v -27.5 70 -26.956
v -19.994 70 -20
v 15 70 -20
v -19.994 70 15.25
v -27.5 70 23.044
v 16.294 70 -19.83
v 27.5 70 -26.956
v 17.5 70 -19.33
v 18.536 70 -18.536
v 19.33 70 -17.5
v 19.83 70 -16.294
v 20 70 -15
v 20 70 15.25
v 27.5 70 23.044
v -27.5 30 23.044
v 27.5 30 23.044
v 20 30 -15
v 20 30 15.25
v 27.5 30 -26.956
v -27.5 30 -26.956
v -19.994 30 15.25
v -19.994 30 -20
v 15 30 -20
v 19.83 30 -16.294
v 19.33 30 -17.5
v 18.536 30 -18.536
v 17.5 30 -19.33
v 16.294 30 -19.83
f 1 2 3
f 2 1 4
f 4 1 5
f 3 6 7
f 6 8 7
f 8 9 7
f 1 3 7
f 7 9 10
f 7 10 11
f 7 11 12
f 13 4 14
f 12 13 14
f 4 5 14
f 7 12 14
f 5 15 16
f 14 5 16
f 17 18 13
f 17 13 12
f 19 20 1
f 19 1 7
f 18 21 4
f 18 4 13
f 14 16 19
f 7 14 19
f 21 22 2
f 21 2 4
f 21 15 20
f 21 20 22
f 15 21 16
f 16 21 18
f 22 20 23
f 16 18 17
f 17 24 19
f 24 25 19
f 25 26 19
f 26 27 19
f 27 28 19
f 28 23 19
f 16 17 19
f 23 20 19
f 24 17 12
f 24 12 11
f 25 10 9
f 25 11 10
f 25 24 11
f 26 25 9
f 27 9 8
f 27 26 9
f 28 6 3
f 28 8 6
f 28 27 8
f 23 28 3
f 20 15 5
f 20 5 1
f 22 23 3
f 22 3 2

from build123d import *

# Parameters (mm, degrees)
CROQUIS1_R                              = 15.25
CROQUIS1_R_2                            = 2.125
SOPORTE_CAJA_REDUCTORA_DEPTH            = 20
CROQUIS3_R                              = 2.125
CORTAR_EXTRUIR1_DEPTH                   = 51.423828692
REDONDEO1_R                             = 5
BOSS_EXTRUDE1_DEPTH                     = 20
CUT_EXTRUDE1_REACH                      = 55.852
SKETCH2_R                               = 1.625
CUT_EXTRUDE2_DEPTH                      = 2
SKETCH4_R                               = 1.625
CUT_EXTRUDE3_DEPTH                      = 63.291652731
CUT_EXTRUDE4_START                      = -4.5
CUT_EXTRUDE4_DEPTH                      = 2
CROQUIS6_W                              = 4.75
CROQUIS6_H                              = 4.75
CORTAR_EXTRUIR17_DEPTH                  = 42.231056256
CROQUIS7_W                              = 60
CROQUIS7_H                              = 20
CORTAR_EXTRUIR18_DEPTH                  = 51.423828692
SALIENTE_EXTRUIR2_DEPTH                 = 49
SOPORTE_START                           = -15
SOPORTE_MOTOR_DEPTH                     = 15
CROQUIS12_R                             = 2.125
AGUJEROS_DE_SUJECION_A_BASE_DEPTH       = 84.087679592
TUERCA_START                            = -4
TUERCA_AGUJERO_DE_SUJECION_A_BASE_DEPTH = 10
SALIENTE_EXTRUIR4_DEPTH                 = 15
CORTAR_EXTRUIR19_DEPTH                  = 25
CROQUIS14_W                             = 50
CROQUIS14_H                             = 118
CORTAR_EXTRUIR22_DEPTH                  = 146.556045907
CROQUIS15_W                             = 10
CROQUIS15_H                             = 7
CORTAR_EXTRUIR23_DEPTH                  = 42.231056256
CORTAR_EXTRUIR24_DEPTH                  = 42.231056256
CROQUIS18_W                             = 40
CROQUIS18_H                             = 10
CORTAR_EXTRUIR25_DEPTH                  = 44.27311521
SALIENTE_EXTRUIR5_DEPTH                 = 10
CROQUIS20_R                             = 1
CORTAR_EXTRUIR26_DEPTH                  = 49.229270158
CORTAR_EXTRUIR27_REACH                  = 62.959
CORTAR_EXTRUIR27_END_RADIUS             = 15.25
CROQUIS21_R                             = 1.625
CROQUIS22_R                             = 2.125
CROQUIS22_R_2                           = 1
SALIENTE_EXTRUIR6_DEPTH                 = 10
CROQUIS23_R                             = 1.625
CORTAR_EXTRUIR28_DEPTH                  = 52.269508521
CORTAR_EXTRUIR29_START                  = -3
CORTAR_EXTRUIR29_DEPTH                  = 10
SALIENTE_EXTRUIR7_DEPTH                 = 10
CORTAR_EXTRUIR30_REACH                  = 72.235
CROQUIS27_R                             = 1.625
CORTAR_EXTRUIR31_REACH                  = 75.235
CORTAR_EXTRUIR31_START                  = -3
CORTAR_EXTRUIR32_REACH                  = 58.612
CROQUIS29_R                             = 1.625
CORTAR_EXTRUIR33_REACH                  = 61.112
CORTAR_EXTRUIR33_START                  = -2.5
CROQUIS35_W                             = 13.305418987
CROQUIS35_H                             = 6.826864192
CORTAR_EXTRUIR34_DEPTH                  = 63.931555098
CORTAR_EXTRUIR34_DEPTH_BACK             = 63.931555098
CORTAR_EXTRUIR35_START                  = -3
CORTAR_EXTRUIR35_DEPTH                  = 10
SALIENTE_EXTRUIR8_DEPTH                 = 10
SALIENTE_EXTRUIR9_DEPTH                 = 13
SALIENTE_EXTRUIR10_DEPTH                = 3
CROQUIS40_W                             = 106.583537839
CROQUIS40_H                             = 47.391515964
CORTAR_EXTRUIR36_DEPTH                  = 80.887064817
CORTAR_EXTRUIR36_DEPTH_BACK             = 80.887064817
CORTAR_EXTRUIR37_DEPTH                  = 67.2524009
CORTAR_EXTRUIR37_DEPTH_BACK             = 67.2524009
CORTAR_EXTRUIR38_DEPTH                  = 79.704784639
CORTAR_EXTRUIR38_DEPTH_BACK             = 79.704784639
SALIENTE_EXTRUIR11_DEPTH                = 10
CORTAR_EXTRUIR39_DEPTH                  = 63.9908649
CROQUIS45_W                             = 31.470301378
CROQUIS45_H                             = 10
CROQUIS45_R                             = 1.625
SALIENTE_EXTRUIR12_DEPTH                = 2.5
SALIENTE_EXTRUIR13_DEPTH                = 10
CORTAR_EXTRUIR40_START                  = -2
CROQUIS47_R                             = 1.625
CORTAR_EXTRUIR40_DEPTH                  = 10
CORTAR_EXTRUIR41_START                  = -12
CROQUIS48_R                             = 1.625
CORTAR_EXTRUIR41_DEPTH                  = 12
CROQUIS49_W                             = 34.796066513
CROQUIS49_H                             = 42.211026982
CORTAR_EXTRUIR42_DEPTH                  = 52.795622989
CORTAR_EXTRUIR42_DEPTH_BACK             = 52.795622989
CROQUIS51_R                             = 15.25
CROQUIS51_R_2                           = 14.25
SALIENTE_EXTRUIR14_DEPTH                = 10
CORTAR_EXTRUIR43_DEPTH                  = 10
CORTAR_EXTRUIR44_DEPTH                  = 10
CORTAR_EXTRUIR45_DEPTH                  = 10
SALIENTE_EXTRUIR15_DEPTH                = 10
CROQUIS56_W                             = 55
CROQUIS56_H                             = 50
SALIENTE_EXTRUIR16_DEPTH                = 5
CROQUIS57_W                             = 42.651963039
CROQUIS57_H                             = 12.802181648
CORTAR_EXTRUIR46_DEPTH                  = 71.545387859
CORTAR_EXTRUIR46_DEPTH_BACK             = 71.545387859
CROQUIS58_R                             = 2.125
CORTAR_EXTRUIR47_DEPTH                  = 5
CROQUIS59_W                             = 55
CROQUIS59_H                             = 50
SALIENTE_EXTRUIR17_DEPTH                = 40


with BuildPart() as part:
    # Croquis1 → Soporte caja reductora (new body)
    with BuildSketch(Plane(origin=(0, 0, 0), x_dir=(1, 0, 0), z_dir=(0, 1, 0))):
        Polygon((-30, -15.25), (-20, -15.25), (-20, -20), (20, -20), (20, -15.25), (30, -15.25), (30, -7.25), (20, -4.25), (20, 20), (-20, 20), (-20, -4.25), (-30, -7.25), align=None)
        with Locations(Location((0, 0, 0), (0, 0, 270))):
            Circle(CROQUIS1_R, mode=Mode.SUBTRACT)
        with Locations(Location((-15, 15, 0), (0, 0, 270))):
            Circle(CROQUIS1_R_2, mode=Mode.SUBTRACT)
        with Locations(Location((15, 15, 0), (0, 0, 270))):
            Circle(CROQUIS1_R_2, mode=Mode.SUBTRACT)
    extrude(amount=-SOPORTE_CAJA_REDUCTORA_DEPTH)

    # Croquis3 → Cortar-Extruir1 (cut, through all)
    with BuildSketch(Plane.XY.offset(15.25)):
        with Locations((-23.5, -10)):
            Circle(CROQUIS3_R)
        with Locations((23.5, -10)):
            Circle(CROQUIS3_R)
    extrude(amount=-CORTAR_EXTRUIR1_DEPTH, mode=Mode.SUBTRACT)

    # Redondeo1
    redondeo1_edges = [part.edges().sort_by_distance(p)[0] for p in [
        (-20, -10, -20),
        (20, -10, -20),
    ]]
    fillet(redondeo1_edges, radius=REDONDEO1_R)

    # Sketch1 → Boss-Extrude1 (add)
    with BuildSketch(Plane(origin=(0, 0, 0), x_dir=(1, 0, 0), z_dir=(0, 1, 0))):
        with BuildLine():
            Line((25.5, 15), (20, 15))
            ThreePointArc((20, 15), (18.535533906, 18.535533906), (15, 20))
            Line((15, 20), (30, 20))
            Line((30, 20), (30, 8))
            Line((30, 8), (25.5, 8))
            Line((25.5, 8), (25.5, 15))
        make_face()
    extrude(amount=-BOSS_EXTRUDE1_DEPTH)

    # Sketch2 → Cut-Extrude1 (cut, up to next)
    with BuildSketch(Plane(origin=(0, 0, -20), x_dir=(-1, 0, 0), z_dir=(0, 0, -1)), mode=Mode.PRIVATE) as cut_extrude1_sk1:
        with Locations((-22.75, -10)):
            Circle(SKETCH2_R)
    cut_extrude1_tool1 = extrude(cut_extrude1_sk1.sketch, amount=-CUT_EXTRUDE1_REACH, mode=Mode.PRIVATE) & part.part
    add(cut_extrude1_tool1.solids().sort_by_distance((22.75, -10, -20))[0], mode=Mode.SUBTRACT)

    # Sketch3 → Cut-Extrude2 (cut)
    with BuildSketch(Plane.XY.offset(-15)):
        Polygon((20, -11.58771324), (22.75, -13.175426481), (25.5, -11.58771324), (25.5, -8.41228676), (22.75, -6.824573519), (20, -8.41228676), align=None)
    extrude(amount=-CUT_EXTRUDE2_DEPTH, mode=Mode.SUBTRACT)

    # Sketch4 → Cut-Extrude3 (cut, through all)
    with BuildSketch(Plane.ZY.offset(-25.5)):
        with Locations((-12.25, -10)):
            Circle(SKETCH4_R)
    extrude(amount=-CUT_EXTRUDE3_DEPTH, mode=Mode.SUBTRACT)

    # Sketch5 → Cut-Extrude4 (cut)
    with BuildSketch(Plane(origin=(30, 0, 0), x_dir=(0, 0, -1), z_dir=(1, 0, 0)).offset(CUT_EXTRUDE4_START)):
        Polygon((15, -11.58771324), (15, -8.41228676), (12.25, -6.824573519), (9.5, -8.41228676), (9.5, -11.58771324), (12.25, -13.175426481), align=None)
    extrude(amount=CUT_EXTRUDE4_DEPTH, mode=Mode.SUBTRACT)

    # Croquis6 → Cortar-Extruir17 (cut, through all)
    with BuildSketch(Plane(origin=(0, 0, 0), x_dir=(1, 0, 0), z_dir=(0, 1, 0))):
        Polygon((0, -15.25), (-15.25, -15.25), (-15.25, -20), (15.25, -20), (15.25, -15.25), align=None)
        with Locations((-17.625, -17.625)):
            Rectangle(CROQUIS6_W, CROQUIS6_H)
        with BuildLine():
            ThreePointArc((0, -15.25), (-10.783378413, -10.783378413), (-15.25, 0))
            Line((-15.25, 0), (-15.25, -15.25))
            Line((-15.25, -15.25), (0, -15.25))
        make_face()
        with BuildLine():
            Line((15.25, -15.25), (15.25, 0))
            ThreePointArc((15.25, 0), (10.783378413, -10.783378413), (0, -15.25))
            Line((0, -15.25), (15.25, -15.25))
        make_face()
        with Locations((17.625, -17.625)):
            Rectangle(CROQUIS6_W, CROQUIS6_H)
    extrude(amount=-CORTAR_EXTRUIR17_DEPTH, mode=Mode.SUBTRACT)


with BuildPart() as body_2:
    # Simetría1: mirrored copy
    add(part.part.mirror(Plane.ZX))

    # Croquis8 → Saliente-Extruir2 (add)
    with BuildSketch(Plane(origin=(0, 20, 0), x_dir=(1, 0, 0), z_dir=(0, 1, 0))):
        with BuildLine():
            Line((-12.664515522, 20), (-11.040489496, 13.939052358))
            Line((-11.040489496, 13.939052358), (-10.315162126, 11.232093763))
            ThreePointArc((-10.315162126, 11.232093763), (0, 15.25), (10.315162126, 11.232093763))
            Line((10.315162126, 11.232093763), (10.817418481, 13.87928066))
            Line((10.817418481, 13.87928066), (11.978715476, 20))
            Line((11.978715476, 20), (-12.664515522, 20))
        make_face()
    extrude(amount=SALIENTE_EXTRUIR2_DEPTH)

    # Croquis9 → Soporte motor (add)
    with BuildSketch(Plane(origin=(0, 69, 0), x_dir=(1, 0, 0), z_dir=(0, 1, 0)).offset(SOPORTE_START)):
        with BuildLine():
            Line((-20, 15), (-20, -4.25))
            Line((-20, -4.25), (-30, -7.25))
            Line((-30, -7.25), (-30, -15.25))
            Line((-30, -15.25), (0, -15.25))
            Line((0, -15.25), (0, -14.75))
            ThreePointArc((0, -14.75), (-10.429825023, 10.429825023), (14.75, 0))
            Line((14.75, 0), (20, 0))
            Line((20, 0), (20, 13.936837101))
            Line((20, 13.936837101), (12.664515522, 20))
            Line((12.664515522, 20), (-15, 20))
            ThreePointArc((-15, 20), (-18.535533906, 18.535533906), (-20, 15))
        make_face()
    extrude(amount=-SOPORTE_MOTOR_DEPTH)

    # Croquis12 → Agujeros de sujecion a base (cut, through all)
    with BuildSketch(Plane.XY.offset(15.25)):
        with Locations((-23.5, 46.5)):
            Circle(CROQUIS12_R)
    extrude(amount=-AGUJEROS_DE_SUJECION_A_BASE_DEPTH, mode=Mode.SUBTRACT)

    # Croquis13 → Tuerca Agujero de sujecion a base (cut)
    with BuildSketch(Plane.XY.offset(15.25).offset(TUERCA_START)):
        Polygon((-20, 44.479274058), (-20, 48.520725942), (-23.5, 50.541451884), (-27, 48.520725942), (-27, 44.479274058), (-23.5, 42.458548116), align=None)
    extrude(amount=-TUERCA_AGUJERO_DE_SUJECION_A_BASE_DEPTH, mode=Mode.SUBTRACT)

    # Croquis10 → Saliente-Extruir4 (add)
    with BuildSketch(Plane(origin=(0, 69, 0), x_dir=(1, 0, 0), z_dir=(0, 1, 0))):
        with BuildLine():
            ThreePointArc((10.315162126, 11.232093763), (0, 15.25), (-10.315162126, 11.232093763))
            Line((-10.315162126, 11.232093763), (-10.16850369, 10.684757026))
            ThreePointArc((-10.16850369, 10.684757026), (0, 14.75), (10.16850369, 10.684757026))
            Line((10.16850369, 10.684757026), (10.315162126, 11.232093763))
        make_face()
    extrude(amount=-SALIENTE_EXTRUIR4_DEPTH)

    # Croquis11 → Cortar-Extruir19 (cut)
    with BuildSketch(Plane.XZ):
        with BuildLine():
            Line((15.25, 4.25), (20, 4.25))
            Line((20, 4.25), (21.972856468, 4.84185694))
            ThreePointArc((21.972856468, 4.84185694), (19.948931102, 10.40625523), (16.543503257, 15.25))
            Line((16.543503257, 15.25), (15.25, 15.25))
            Line((15.25, 15.25), (15.25, 4.25))
        make_face()
        with BuildLine():
            Line((21.972856468, 4.84185694), (30, 7.25))
            Line((30, 7.25), (30, 15.25))
            Line((30, 15.25), (16.543503257, 15.25))
            ThreePointArc((16.543503257, 15.25), (19.948931102, 10.40625523), (21.972856468, 4.84185694))
        make_face()
        with BuildLine():
            ThreePointArc((20, -15), (18.535533906, -18.535533906), (15, -20))
            Line((15, -20), (30, -20))
            Line((30, -20), (30, -8))
            Line((30, -8), (25.5, -8))
            Line((25.5, -8), (25.5, -15))
            Line((25.5, -15), (20, -15))
        make_face()
    extrude(amount=-CORTAR_EXTRUIR19_DEPTH, mode=Mode.SUBTRACT)

    # Simetría2: body 2 across face


with BuildPart() as part_1:
    add(part.part)

    # Croquis7 → Cortar-Extruir18 (cut, through all)
    with BuildSketch(Plane(origin=(0, 0, -20), x_dir=(-1, 0, 0), z_dir=(0, 0, -1))):
        with Locations((0, -10)):
            Rectangle(CROQUIS7_W, CROQUIS7_H)
    extrude(amount=-CORTAR_EXTRUIR18_DEPTH, mode=Mode.SUBTRACT)


with BuildPart() as body_2_1:
    add(body_2.part)
    add(body_2.part.mirror(Plane(origin=(-0.229209569, 69, -16.663998028), x_dir=(0, 0, 1), z_dir=(0, 1, 0))))

    # Croquis14 → Cortar-Extruir22 (cut, through all)
    with BuildSketch(Plane.XY.offset(15.25)):
        with Locations((-5, 79)):
            Rectangle(CROQUIS14_W, CROQUIS14_H)
    extrude(amount=-CORTAR_EXTRUIR22_DEPTH, mode=Mode.SUBTRACT)

    # Croquis15 → Cortar-Extruir23 (cut, through all)
    with BuildSketch(Plane.XZ):
        with Locations((-25, 7.75)):
            Rectangle(CROQUIS15_W, CROQUIS15_H)
    extrude(amount=-CORTAR_EXTRUIR23_DEPTH, mode=Mode.SUBTRACT)

    # Croquis16 → Cortar-Extruir24 (cut, through all)
    with BuildSketch(Plane.XZ):
        Polygon((-30, 15.25), (-15.25, 15.25), (-15.25, 12.75), (-20, 12.75), (-20, 11.25), (-30, 11.25), (-30, 12.75), align=None)
    extrude(amount=-CORTAR_EXTRUIR24_DEPTH, mode=Mode.SUBTRACT)

    # Croquis18 → Cortar-Extruir25 (cut, through all)
    with BuildSketch(Plane(origin=(0, 0, -20), x_dir=(-1, 0, 0), z_dir=(0, 0, -1))):
        with Locations((0, 5)):
            Rectangle(CROQUIS18_W, CROQUIS18_H)
    extrude(amount=-CORTAR_EXTRUIR25_DEPTH, mode=Mode.SUBTRACT)

    # Croquis19 → Saliente-Extruir5 (add)
    with BuildSketch(Plane(origin=(0, 20, 0), x_dir=(1, 0, 0), z_dir=(0, 1, 0))):
        Polygon((-20, -12.75), (-34, -12.75), (-34, -7.75), (-24, -7.75), (-20, -3.75), align=None)
    extrude(amount=-SALIENTE_EXTRUIR5_DEPTH)

    # Croquis20 → Cortar-Extruir26 (cut, through all)
    with BuildSketch(Plane(origin=(0, 0, 7.75), x_dir=(-1, 0, 0), z_dir=(0, 0, -1))):
        with Locations((29, 15)):
            Circle(CROQUIS20_R)
    extrude(amount=-CORTAR_EXTRUIR26_DEPTH, mode=Mode.SUBTRACT)

    # Cortar-Extruir27: up to this cylinder (the profile starts outside it)
    cortar_extruir27_end = Plane(origin=(0, 15, 0), z_dir=(0, -1, 0)) * Cylinder(CORTAR_EXTRUIR27_END_RADIUS, 157.418, mode=Mode.PRIVATE)
    # Croquis21 → Cortar-Extruir27 (cut, up to the surface)
    with BuildSketch(Plane(origin=(20, 0, 0), x_dir=(0, 0, -1), z_dir=(1, 0, 0)), mode=Mode.PRIVATE) as cortar_extruir27_sk1:
        with Locations((4.75, 15)):
            Circle(CROQUIS21_R)
    cortar_extruir27_tool1 = extrude(cortar_extruir27_sk1.sketch, amount=-CORTAR_EXTRUIR27_REACH, mode=Mode.PRIVATE) - cortar_extruir27_end
    add(cortar_extruir27_tool1.solids().sort_by_distance((20, 15, -4.75))[0], mode=Mode.SUBTRACT)

    # Croquis22 → Saliente-Extruir6 (add)
    with BuildSketch(Plane.XZ.offset(-10)):
        with Locations((-15, -15)):
            Circle(CROQUIS22_R)
        with Locations(Location((-15, -15, 0), (0, 0, 270))):
            Circle(CROQUIS22_R_2, mode=Mode.SUBTRACT)
        with Locations((15, -15)):
            Circle(CROQUIS22_R)
        with Locations(Location((15, -15, 0), (0, 0, 270))):
            Circle(CROQUIS22_R_2, mode=Mode.SUBTRACT)
    extrude(amount=-SALIENTE_EXTRUIR6_DEPTH)

    # Croquis23 → Cortar-Extruir28 (cut, through all)
    with BuildSketch(Plane(origin=(0, 0, -20), x_dir=(-1, 0, 0), z_dir=(0, 0, -1))):
        with Locations((0, 15)):
            Circle(CROQUIS23_R)
    extrude(amount=-CORTAR_EXTRUIR28_DEPTH, mode=Mode.SUBTRACT)

    # Croquis24 → Cortar-Extruir29 (cut)
    with BuildSketch(Plane(origin=(0, 0, -20), x_dir=(-1, 0, 0), z_dir=(0, 0, -1)).offset(CORTAR_EXTRUIR29_START)):
        Polygon((1.58771324, 12.25), (3.175426481, 15), (1.58771324, 17.75), (-1.58771324, 17.75), (-3.175426481, 15), (-1.58771324, 12.25), align=None)
    extrude(amount=-CORTAR_EXTRUIR29_DEPTH, mode=Mode.SUBTRACT)

    # Croquis26 → Saliente-Extruir7 (add)
    with BuildSketch(Plane.XZ.offset(-10)):
        Polygon((-34, 7.75), (-34, 12.75), (-58.825, 12.75), (-39.160527763, -4.104491148), (-20, -4.104491148), (-20, -0.104491148), (-35.732113118, -0.104491148), (-29, 7.75), align=None)
        Polygon((-34.268209086, 7.75), (-39.594516123, 1.535690951), (-46.844874897, 7.75), align=None, mode=Mode.SUBTRACT)
    extrude(amount=-SALIENTE_EXTRUIR7_DEPTH)

    # Croquis27 → Cortar-Extruir30 (cut, up to next)
    with BuildSketch(Plane.XY.offset(12.75), mode=Mode.PRIVATE) as cortar_extruir30_sk1:
        with Locations((-40.544874897, 15)):
            Circle(CROQUIS27_R)
    cortar_extruir30_tool1 = extrude(cortar_extruir30_sk1.sketch, amount=-CORTAR_EXTRUIR30_REACH, mode=Mode.PRIVATE) & body_2_1.part
    # Croquis27 → Cortar-Extruir30 (cut, up to next)
    with BuildSketch(Plane.XY.offset(12.75), mode=Mode.PRIVATE) as cortar_extruir30_sk2:
        with Locations((-29, 15)):
            Circle(CROQUIS27_R)
    cortar_extruir30_tool2 = extrude(cortar_extruir30_sk2.sketch, amount=-CORTAR_EXTRUIR30_REACH, mode=Mode.PRIVATE) & body_2_1.part
    add(cortar_extruir30_tool1.solids().sort_by_distance((-40.544875, 15, 12.75))[0], mode=Mode.SUBTRACT)
    add(cortar_extruir30_tool2.solids().sort_by_distance((-29, 15, 12.75))[0], mode=Mode.SUBTRACT)

    # Croquis28 → Cortar-Extruir31 (cut, up to next)
    with BuildSketch(Plane.XY.offset(12.75).offset(CORTAR_EXTRUIR31_START), mode=Mode.PRIVATE) as cortar_extruir31_sk1:
        Polygon((-38.957161657, 12.25), (-37.369448416, 15), (-38.957161657, 17.75), (-42.132588137, 17.75), (-43.720301378, 15), (-42.132588137, 12.25), align=None)
    cortar_extruir31_tool1 = extrude(cortar_extruir31_sk1.sketch, amount=-CORTAR_EXTRUIR31_REACH, mode=Mode.PRIVATE) & body_2_1.part
    # Croquis28 → Cortar-Extruir31 (cut, up to next)
    with BuildSketch(Plane.XY.offset(12.75).offset(CORTAR_EXTRUIR31_START), mode=Mode.PRIVATE) as cortar_extruir31_sk2:
        Polygon((-27.41228676, 12.25), (-25.824573519, 15), (-27.41228676, 17.75), (-30.58771324, 17.75), (-32.175426481, 15), (-30.58771324, 12.25), align=None)
    cortar_extruir31_tool2 = extrude(cortar_extruir31_sk2.sketch, amount=-CORTAR_EXTRUIR31_REACH, mode=Mode.PRIVATE) & body_2_1.part
    add(cortar_extruir31_tool1.solids().sort_by_distance((-40.544875, 15, 9.75))[0], mode=Mode.SUBTRACT)
    add(cortar_extruir31_tool2.solids().sort_by_distance((-29, 15, 9.75))[0], mode=Mode.SUBTRACT)

    # Croquis29 → Cortar-Extruir32 (cut, up to next)
    with BuildSketch(Plane(origin=(-18.612848159, 0, -21.715982563), x_dir=(-0.7592713073348843, 0, 0.6507742172658468), z_dir=(-0.6507742172658468, 0, -0.7592713073348843)), mode=Mode.PRIVATE) as cortar_extruir32_sk1:
        with Locations((33.812368097, 15)):
            Circle(CROQUIS29_R)
    cortar_extruir32_tool1 = extrude(cortar_extruir32_sk1.sketch, amount=-CORTAR_EXTRUIR32_REACH, mode=Mode.PRIVATE) & body_2_1.part
    add(cortar_extruir32_tool1.solids().sort_by_distance((-44.285609, 15, 0.288235))[0], mode=Mode.SUBTRACT)

    # Croquis31 → Cortar-Extruir33 (cut, up to next)
    with BuildSketch(Plane(origin=(-18.612848159, 0, -21.715982563), x_dir=(-0.7592713073348843, 0, 0.6507742172658468), z_dir=(-0.6507742172658468, 0, -0.7592713073348843)).offset(CORTAR_EXTRUIR33_START), mode=Mode.PRIVATE) as cortar_extruir33_sk1:
        Polygon((36.562368097, 16.58771324), (33.812368097, 18.175426481), (31.062368097, 16.58771324), (31.062368097, 13.41228676), (33.812368097, 11.824573519), (36.562368097, 13.41228676), align=None)
    cortar_extruir33_tool1 = extrude(cortar_extruir33_sk1.sketch, amount=-CORTAR_EXTRUIR33_REACH, mode=Mode.PRIVATE) & body_2_1.part
    add(cortar_extruir33_tool1.solids().sort_by_distance((-42.658674, 15, 2.186413))[0], mode=Mode.SUBTRACT)

    # Croquis35 → Cortar-Extruir34 (cut, two sides)
    with BuildSketch(Plane(origin=(0, 20, 0), x_dir=(1, 0, 0), z_dir=(0, 1, 0))) as cortar_extruir34_sk:
        with Locations((17.04227466, -3.413432096)):
            Rectangle(CROQUIS35_W, CROQUIS35_H)
    extrude(amount=CORTAR_EXTRUIR34_DEPTH, mode=Mode.SUBTRACT)
    extrude(cortar_extruir34_sk.sketch, amount=-CORTAR_EXTRUIR34_DEPTH_BACK, mode=Mode.SUBTRACT)

    # Croquis36 → Cortar-Extruir35 (cut)
    with BuildSketch(Plane(origin=(20, 0, 0), x_dir=(0, 0, -1), z_dir=(1, 0, 0)).offset(CORTAR_EXTRUIR35_START)):
        Polygon((7.5, 16.58771324), (4.75, 18.175426481), (2, 16.58771324), (2, 13.41228676), (4.75, 11.824573519), (7.5, 13.41228676), align=None)
    extrude(amount=-CORTAR_EXTRUIR35_DEPTH, mode=Mode.SUBTRACT)

    # Croquis37 → Saliente-Extruir8 (add)
    with BuildSketch(Plane.XZ.offset(-10)):
        Polygon((-39.160527763, -4.104491148), (-20.614919368, -20), (-15, -20), (-19.558128305, -15.637570403), (-33.014002756, -4.104491148), align=None)
    extrude(amount=-SALIENTE_EXTRUIR8_DEPTH)

    # Croquis38 → Saliente-Extruir9 (add)
    with BuildSketch(Plane.XZ.offset(-10)):
        Polygon((-58.825, 12.75), (-38.825, 12.75), (-38.825, 9.75), (-55.324839942, 9.75), align=None)
    extrude(amount=SALIENTE_EXTRUIR9_DEPTH)

    # Croquis39 → Saliente-Extruir10 (add)
    with BuildSketch(Plane.XZ.offset(-10)):
        Polygon((-38.825, 9.75), (-38.825, 7.75), (-38.825, 5.75), (-50.657959865, 5.75), (-52.991399903, 7.75), (-55.324839942, 9.75), align=None)
    extrude(amount=SALIENTE_EXTRUIR10_DEPTH)

    # Simetría3: body 2 across face


with BuildPart() as body_2_2:
    add(body_2_1.part)
    add(body_2_1.part.mirror(Plane(origin=(-18.003999227, 20, -4.220503046), x_dir=(0, 0, 1), z_dir=(0, 1, 0))))

    # Croquis40 → Cortar-Extruir36 (cut, two sides)
    with BuildSketch(Plane(origin=(0, 0, -20), x_dir=(-1, 0, 0), z_dir=(0, 0, -1))) as cortar_extruir36_sk:
        with Locations((22.395502026, -3.695757982)):
            Rectangle(CROQUIS40_W, CROQUIS40_H)
    extrude(amount=CORTAR_EXTRUIR36_DEPTH, mode=Mode.SUBTRACT)
    extrude(cortar_extruir36_sk.sketch, amount=-CORTAR_EXTRUIR36_DEPTH_BACK, mode=Mode.SUBTRACT)

    # Croquis41 → Cortar-Extruir37 (cut, two sides)
    with BuildSketch(Plane.XZ.offset(-20)) as cortar_extruir37_sk:
        Polygon((-19.992980133, -22.302484261), (-20, 3.75), (-24, 7.75), (-56.035110209, 7.75), align=None)
    extrude(amount=CORTAR_EXTRUIR37_DEPTH, mode=Mode.SUBTRACT)
    extrude(cortar_extruir37_sk.sketch, amount=-CORTAR_EXTRUIR37_DEPTH_BACK, mode=Mode.SUBTRACT)

    # Croquis42 → Cortar-Extruir38 (cut, two sides)
    with BuildSketch(Plane(origin=(0, 0, 9.75), x_dir=(-1, 0, 0), z_dir=(0, 0, -1))) as cortar_extruir38_sk:
        Polygon((46.720301378, 20), (46.720301378, 30), (38.825, 30), (33.492952769, 43.760628779), (49.525340398, 48.951442806), (67.200390695, 42.512205152), (65.906601328, 20), (51.713995885, 13.864168239), align=None)
    extrude(amount=CORTAR_EXTRUIR38_DEPTH, mode=Mode.SUBTRACT)
    extrude(cortar_extruir38_sk.sketch, amount=-CORTAR_EXTRUIR38_DEPTH_BACK, mode=Mode.SUBTRACT)

    # Croquis43 → Saliente-Extruir11 (add)
    with BuildSketch(Plane.XZ.offset(-20)):
        Polygon((-19.993600539, -20), (-46.720301378, 7.75), (-43.839252857, 10.524807997), (-17.112552018, -17.225192003), align=None)
    extrude(amount=-SALIENTE_EXTRUIR11_DEPTH)

    # Croquis44 → Cortar-Extruir39 (cut, through all)
    with BuildSketch(Plane(origin=(0, 0, 9.75), x_dir=(-1, 0, 0), z_dir=(0, 0, -1))):
        Polygon((38.957161657, 27.75), (37.369448416, 25), (38.957161657, 22.25), (42.132588137, 22.25), (43.720301378, 25), (42.132588137, 27.75), align=None)
    extrude(amount=CORTAR_EXTRUIR39_DEPTH, mode=Mode.SUBTRACT)

    # Croquis45 → Saliente-Extruir12 (add)
    with BuildSketch(Plane.XY.offset(12.75)):
        with Locations((-30.985150689, 25)):
            Rectangle(CROQUIS45_W, CROQUIS45_H)
        with Locations((-40.544874897, 25)):
            Circle(CROQUIS45_R, mode=Mode.SUBTRACT)
        with Locations((-29, 25)):
            Circle(CROQUIS45_R, mode=Mode.SUBTRACT)
    extrude(amount=SALIENTE_EXTRUIR12_DEPTH)

    # Croquis46 → Saliente-Extruir13 (add)
    with BuildSketch(Plane.XZ.offset(-20)):
        with BuildLine():
            Line((15.25, 0), (20, 0))
            Line((20, 0), (20, 15.25))
            Line((20, 15.25), (7.549834435, 15.25))
            Line((7.549834435, 15.25), (7.549834435, 13.25))
            ThreePointArc((7.549834435, 13.25), (13.185171124, 7.662490615), (15.25, 0))
        make_face()
        with BuildLine():
            Line((-15.25, 0), (-15.25, 15.25))
            Line((-15.25, 15.25), (-7.549834435, 15.25))
            Line((-7.549834435, 15.25), (-7.549834435, 13.25))
            ThreePointArc((-7.549834435, 13.25), (-13.185171124, 7.662490615), (-15.25, 0))
        make_face()
    extrude(amount=-SALIENTE_EXTRUIR13_DEPTH)

    # Croquis47 → Cortar-Extruir40 (cut)
    with BuildSketch(Plane.XY.offset(15.25).offset(CORTAR_EXTRUIR40_START)):
        Polygon((15.41228676, 22.352505966), (17, 25.102505966), (15.41228676, 27.852505966), (12.236860279, 27.852505966), (10.649147039, 25.102505966), (12.236860279, 22.352505966), align=None)
        with Locations((13.824573519, 25.102505966)):
            Circle(CROQUIS47_R, mode=Mode.SUBTRACT)
        Polygon((-12.236860279, 22.352505966), (-15.41228676, 22.352505966), (-17, 25.102505966), (-15.41228676, 27.852505966), (-12.236860279, 27.852505966), (-10.649147039, 25.102505966), align=None)
        with Locations(Location((-13.824573519, 25.102505966, 0), (0, 0, 131.421584744))):
            Circle(CROQUIS47_R, mode=Mode.SUBTRACT)
    extrude(amount=-CORTAR_EXTRUIR40_DEPTH, mode=Mode.SUBTRACT)

    # Croquis48 → Cortar-Extruir41 (cut)
    with BuildSketch(Plane.XY.offset(15.25).offset(CORTAR_EXTRUIR41_START)):
        with Locations((13.824573519, 25.102505966)):
            Circle(CROQUIS48_R)
        with Locations((-13.824573519, 25.102505966)):
            Circle(CROQUIS48_R)
    extrude(amount=CORTAR_EXTRUIR41_DEPTH, mode=Mode.SUBTRACT)

    # Croquis49 → Cortar-Extruir42 (cut, two sides)
    with BuildSketch(Plane.XZ.offset(-20)) as cortar_extruir42_sk:
        with Locations((-37.391633796, 1.105513491)):
            Rectangle(CROQUIS49_W, CROQUIS49_H)
    extrude(amount=CORTAR_EXTRUIR42_DEPTH, mode=Mode.SUBTRACT)
    extrude(cortar_extruir42_sk.sketch, amount=-CORTAR_EXTRUIR42_DEPTH_BACK, mode=Mode.SUBTRACT)

    # Croquis51 → Saliente-Extruir14 (add)
    with BuildSketch(Plane(origin=(0, 30, 0), x_dir=(1, 0, 0), z_dir=(0, 1, 0))):
        Circle(CROQUIS51_R)
        with Locations(Location((0, 0, 0), (0, 0, 270))):
            Circle(CROQUIS51_R_2, mode=Mode.SUBTRACT)
    extrude(amount=-SALIENTE_EXTRUIR14_DEPTH)

    # Croquis52 → Cortar-Extruir43 (cut)
    with BuildSketch(Plane(origin=(0, 0, 13.25), x_dir=(-1, 0, 0), z_dir=(0, 0, -1))):
        Polygon((-10.649147039, 25.102505966), (-12.236860279, 27.852505966), (-15.41228676, 27.852505966), (-17, 25.102505966), (-15.41228676, 22.352505966), (-12.236860279, 22.352505966), align=None)
        Polygon((17, 25.102505966), (15.41228676, 27.852505966), (12.236860279, 27.852505966), (10.649147039, 25.102505966), (12.236860279, 22.352505966), (15.41228676, 22.352505966), align=None)
    extrude(amount=CORTAR_EXTRUIR43_DEPTH, mode=Mode.SUBTRACT)

    # Croquis53 → Cortar-Extruir44 (cut)
    with BuildSketch(Plane.XY.offset(-17)):
        Polygon((3.175426481, 25), (1.58771324, 27.75), (-1.58771324, 27.75), (-3.175426481, 25), (-1.58771324, 22.25), (1.58771324, 22.25), align=None)
    extrude(amount=CORTAR_EXTRUIR44_DEPTH, mode=Mode.SUBTRACT)

    # Croquis54 → Cortar-Extruir45 (cut)
    with BuildSketch(Plane.ZY.offset(-17)):
        Polygon((-4.75, 28.175426481), (-7.5, 26.58771324), (-7.5, 23.41228676), (-4.75, 21.824573519), (-2, 23.41228676), (-2, 26.58771324), align=None)
    extrude(amount=CORTAR_EXTRUIR45_DEPTH, mode=Mode.SUBTRACT)

    # Croquis55 → Saliente-Extruir15 (add)
    with BuildSketch(Plane(origin=(0, 30, 0), x_dir=(1, 0, 0), z_dir=(0, 1, 0))):
        with BuildLine():
            Line((-7.549834435, -13.25), (-7.549834435, -15.25))
            Line((-7.549834435, -15.25), (0, -15.25))
            ThreePointArc((0, -15.25), (-3.905124838, -14.741522988), (-7.549834435, -13.25))
        make_face()
        with BuildLine():
            ThreePointArc((7.549834435, -13.25), (3.905124838, -14.741522988), (0, -15.25))
            Line((0, -15.25), (7.549834435, -15.25))
            Line((7.549834435, -15.25), (7.549834435, -13.25))
        make_face()
    extrude(amount=-SALIENTE_EXTRUIR15_DEPTH)

    # Croquis57 → Cortar-Extruir46 (cut, two sides)
    with BuildSketch(Plane.ZY.offset(27.5)) as cortar_extruir46_sk:
        with Locations((1.32598152, 23.598909176)):
            Rectangle(CROQUIS57_W, CROQUIS57_H)
    extrude(amount=CORTAR_EXTRUIR46_DEPTH, mode=Mode.SUBTRACT)
    extrude(cortar_extruir46_sk.sketch, amount=-CORTAR_EXTRUIR46_DEPTH_BACK, mode=Mode.SUBTRACT)


with BuildPart() as body_2_2_1:
    # Croquis56 → Saliente-Extruir16 (new body)
    with BuildSketch(Plane(origin=(0, 30, 0), x_dir=(1, 0, 0), z_dir=(0, 1, 0))):
        with Locations((0, 1.956478778)):
            Rectangle(CROQUIS56_W, CROQUIS56_H)
        with BuildLine():
            Line((20, -15.25), (20, 15))
            ThreePointArc((20, 15), (18.535533906, 18.535533906), (15, 20))
            Line((15, 20), (-19.993600539, 20))
            Line((-19.993600539, 20), (-19.993600539, -15.25))
            Line((-19.993600539, -15.25), (20, -15.25))
        make_face(mode=Mode.SUBTRACT)
    extrude(amount=SALIENTE_EXTRUIR16_DEPTH)

    # Croquis58 → Cortar-Extruir47 (cut)
    with BuildSketch(Plane.XZ.offset(-30)):
        with Locations(Location((-12.5, 19.25, 0), (0, 0, 270))):
            Circle(CROQUIS58_R)
        with Locations(Location((12.5, 19.25, 0), (0, 0, 270))):
            Circle(CROQUIS58_R)
        with Locations(Location((-12.5, -23.5, 0), (0, 0, 270))):
            Circle(CROQUIS58_R)
        with Locations(Location((12.5, -23.526519471, 0), (0, 0, 270))):
            Circle(CROQUIS58_R)
        with Locations(Location((-23.493600539, 10.125, 0), (0, 0, 270))):
            Circle(CROQUIS58_R)
        with Locations(Location((-23.493600539, -14.875, 0), (0, 0, 270))):
            Circle(CROQUIS58_R)
        with Locations(Location((23.493600539, -14.875, 0), (0, 0, 90))):
            Circle(CROQUIS58_R)
        with Locations(Location((23.493600539, 10.125, 0), (0, 0, 90))):
            Circle(CROQUIS58_R)
    extrude(amount=-CORTAR_EXTRUIR47_DEPTH, mode=Mode.SUBTRACT)

    # Croquis59 → Saliente-Extruir17 (add)
    with BuildSketch(Plane.XZ.offset(-30)):
        with Locations((0, -1.956478778)):
            Rectangle(CROQUIS59_W, CROQUIS59_H)
        with BuildLine():
            Line((-19.993600539, -20), (15, -20))
            ThreePointArc((15, -20), (18.535533906, -18.535533906), (20, -15))
            Line((20, -15), (20, 15.25))
            Line((20, 15.25), (-19.993600539, 15.25))
            Line((-19.993600539, 15.25), (-19.993600539, -20))
        make_face(mode=Mode.SUBTRACT)
    extrude(amount=-SALIENTE_EXTRUIR17_DEPTH)


solid = body_2_2_1.part
